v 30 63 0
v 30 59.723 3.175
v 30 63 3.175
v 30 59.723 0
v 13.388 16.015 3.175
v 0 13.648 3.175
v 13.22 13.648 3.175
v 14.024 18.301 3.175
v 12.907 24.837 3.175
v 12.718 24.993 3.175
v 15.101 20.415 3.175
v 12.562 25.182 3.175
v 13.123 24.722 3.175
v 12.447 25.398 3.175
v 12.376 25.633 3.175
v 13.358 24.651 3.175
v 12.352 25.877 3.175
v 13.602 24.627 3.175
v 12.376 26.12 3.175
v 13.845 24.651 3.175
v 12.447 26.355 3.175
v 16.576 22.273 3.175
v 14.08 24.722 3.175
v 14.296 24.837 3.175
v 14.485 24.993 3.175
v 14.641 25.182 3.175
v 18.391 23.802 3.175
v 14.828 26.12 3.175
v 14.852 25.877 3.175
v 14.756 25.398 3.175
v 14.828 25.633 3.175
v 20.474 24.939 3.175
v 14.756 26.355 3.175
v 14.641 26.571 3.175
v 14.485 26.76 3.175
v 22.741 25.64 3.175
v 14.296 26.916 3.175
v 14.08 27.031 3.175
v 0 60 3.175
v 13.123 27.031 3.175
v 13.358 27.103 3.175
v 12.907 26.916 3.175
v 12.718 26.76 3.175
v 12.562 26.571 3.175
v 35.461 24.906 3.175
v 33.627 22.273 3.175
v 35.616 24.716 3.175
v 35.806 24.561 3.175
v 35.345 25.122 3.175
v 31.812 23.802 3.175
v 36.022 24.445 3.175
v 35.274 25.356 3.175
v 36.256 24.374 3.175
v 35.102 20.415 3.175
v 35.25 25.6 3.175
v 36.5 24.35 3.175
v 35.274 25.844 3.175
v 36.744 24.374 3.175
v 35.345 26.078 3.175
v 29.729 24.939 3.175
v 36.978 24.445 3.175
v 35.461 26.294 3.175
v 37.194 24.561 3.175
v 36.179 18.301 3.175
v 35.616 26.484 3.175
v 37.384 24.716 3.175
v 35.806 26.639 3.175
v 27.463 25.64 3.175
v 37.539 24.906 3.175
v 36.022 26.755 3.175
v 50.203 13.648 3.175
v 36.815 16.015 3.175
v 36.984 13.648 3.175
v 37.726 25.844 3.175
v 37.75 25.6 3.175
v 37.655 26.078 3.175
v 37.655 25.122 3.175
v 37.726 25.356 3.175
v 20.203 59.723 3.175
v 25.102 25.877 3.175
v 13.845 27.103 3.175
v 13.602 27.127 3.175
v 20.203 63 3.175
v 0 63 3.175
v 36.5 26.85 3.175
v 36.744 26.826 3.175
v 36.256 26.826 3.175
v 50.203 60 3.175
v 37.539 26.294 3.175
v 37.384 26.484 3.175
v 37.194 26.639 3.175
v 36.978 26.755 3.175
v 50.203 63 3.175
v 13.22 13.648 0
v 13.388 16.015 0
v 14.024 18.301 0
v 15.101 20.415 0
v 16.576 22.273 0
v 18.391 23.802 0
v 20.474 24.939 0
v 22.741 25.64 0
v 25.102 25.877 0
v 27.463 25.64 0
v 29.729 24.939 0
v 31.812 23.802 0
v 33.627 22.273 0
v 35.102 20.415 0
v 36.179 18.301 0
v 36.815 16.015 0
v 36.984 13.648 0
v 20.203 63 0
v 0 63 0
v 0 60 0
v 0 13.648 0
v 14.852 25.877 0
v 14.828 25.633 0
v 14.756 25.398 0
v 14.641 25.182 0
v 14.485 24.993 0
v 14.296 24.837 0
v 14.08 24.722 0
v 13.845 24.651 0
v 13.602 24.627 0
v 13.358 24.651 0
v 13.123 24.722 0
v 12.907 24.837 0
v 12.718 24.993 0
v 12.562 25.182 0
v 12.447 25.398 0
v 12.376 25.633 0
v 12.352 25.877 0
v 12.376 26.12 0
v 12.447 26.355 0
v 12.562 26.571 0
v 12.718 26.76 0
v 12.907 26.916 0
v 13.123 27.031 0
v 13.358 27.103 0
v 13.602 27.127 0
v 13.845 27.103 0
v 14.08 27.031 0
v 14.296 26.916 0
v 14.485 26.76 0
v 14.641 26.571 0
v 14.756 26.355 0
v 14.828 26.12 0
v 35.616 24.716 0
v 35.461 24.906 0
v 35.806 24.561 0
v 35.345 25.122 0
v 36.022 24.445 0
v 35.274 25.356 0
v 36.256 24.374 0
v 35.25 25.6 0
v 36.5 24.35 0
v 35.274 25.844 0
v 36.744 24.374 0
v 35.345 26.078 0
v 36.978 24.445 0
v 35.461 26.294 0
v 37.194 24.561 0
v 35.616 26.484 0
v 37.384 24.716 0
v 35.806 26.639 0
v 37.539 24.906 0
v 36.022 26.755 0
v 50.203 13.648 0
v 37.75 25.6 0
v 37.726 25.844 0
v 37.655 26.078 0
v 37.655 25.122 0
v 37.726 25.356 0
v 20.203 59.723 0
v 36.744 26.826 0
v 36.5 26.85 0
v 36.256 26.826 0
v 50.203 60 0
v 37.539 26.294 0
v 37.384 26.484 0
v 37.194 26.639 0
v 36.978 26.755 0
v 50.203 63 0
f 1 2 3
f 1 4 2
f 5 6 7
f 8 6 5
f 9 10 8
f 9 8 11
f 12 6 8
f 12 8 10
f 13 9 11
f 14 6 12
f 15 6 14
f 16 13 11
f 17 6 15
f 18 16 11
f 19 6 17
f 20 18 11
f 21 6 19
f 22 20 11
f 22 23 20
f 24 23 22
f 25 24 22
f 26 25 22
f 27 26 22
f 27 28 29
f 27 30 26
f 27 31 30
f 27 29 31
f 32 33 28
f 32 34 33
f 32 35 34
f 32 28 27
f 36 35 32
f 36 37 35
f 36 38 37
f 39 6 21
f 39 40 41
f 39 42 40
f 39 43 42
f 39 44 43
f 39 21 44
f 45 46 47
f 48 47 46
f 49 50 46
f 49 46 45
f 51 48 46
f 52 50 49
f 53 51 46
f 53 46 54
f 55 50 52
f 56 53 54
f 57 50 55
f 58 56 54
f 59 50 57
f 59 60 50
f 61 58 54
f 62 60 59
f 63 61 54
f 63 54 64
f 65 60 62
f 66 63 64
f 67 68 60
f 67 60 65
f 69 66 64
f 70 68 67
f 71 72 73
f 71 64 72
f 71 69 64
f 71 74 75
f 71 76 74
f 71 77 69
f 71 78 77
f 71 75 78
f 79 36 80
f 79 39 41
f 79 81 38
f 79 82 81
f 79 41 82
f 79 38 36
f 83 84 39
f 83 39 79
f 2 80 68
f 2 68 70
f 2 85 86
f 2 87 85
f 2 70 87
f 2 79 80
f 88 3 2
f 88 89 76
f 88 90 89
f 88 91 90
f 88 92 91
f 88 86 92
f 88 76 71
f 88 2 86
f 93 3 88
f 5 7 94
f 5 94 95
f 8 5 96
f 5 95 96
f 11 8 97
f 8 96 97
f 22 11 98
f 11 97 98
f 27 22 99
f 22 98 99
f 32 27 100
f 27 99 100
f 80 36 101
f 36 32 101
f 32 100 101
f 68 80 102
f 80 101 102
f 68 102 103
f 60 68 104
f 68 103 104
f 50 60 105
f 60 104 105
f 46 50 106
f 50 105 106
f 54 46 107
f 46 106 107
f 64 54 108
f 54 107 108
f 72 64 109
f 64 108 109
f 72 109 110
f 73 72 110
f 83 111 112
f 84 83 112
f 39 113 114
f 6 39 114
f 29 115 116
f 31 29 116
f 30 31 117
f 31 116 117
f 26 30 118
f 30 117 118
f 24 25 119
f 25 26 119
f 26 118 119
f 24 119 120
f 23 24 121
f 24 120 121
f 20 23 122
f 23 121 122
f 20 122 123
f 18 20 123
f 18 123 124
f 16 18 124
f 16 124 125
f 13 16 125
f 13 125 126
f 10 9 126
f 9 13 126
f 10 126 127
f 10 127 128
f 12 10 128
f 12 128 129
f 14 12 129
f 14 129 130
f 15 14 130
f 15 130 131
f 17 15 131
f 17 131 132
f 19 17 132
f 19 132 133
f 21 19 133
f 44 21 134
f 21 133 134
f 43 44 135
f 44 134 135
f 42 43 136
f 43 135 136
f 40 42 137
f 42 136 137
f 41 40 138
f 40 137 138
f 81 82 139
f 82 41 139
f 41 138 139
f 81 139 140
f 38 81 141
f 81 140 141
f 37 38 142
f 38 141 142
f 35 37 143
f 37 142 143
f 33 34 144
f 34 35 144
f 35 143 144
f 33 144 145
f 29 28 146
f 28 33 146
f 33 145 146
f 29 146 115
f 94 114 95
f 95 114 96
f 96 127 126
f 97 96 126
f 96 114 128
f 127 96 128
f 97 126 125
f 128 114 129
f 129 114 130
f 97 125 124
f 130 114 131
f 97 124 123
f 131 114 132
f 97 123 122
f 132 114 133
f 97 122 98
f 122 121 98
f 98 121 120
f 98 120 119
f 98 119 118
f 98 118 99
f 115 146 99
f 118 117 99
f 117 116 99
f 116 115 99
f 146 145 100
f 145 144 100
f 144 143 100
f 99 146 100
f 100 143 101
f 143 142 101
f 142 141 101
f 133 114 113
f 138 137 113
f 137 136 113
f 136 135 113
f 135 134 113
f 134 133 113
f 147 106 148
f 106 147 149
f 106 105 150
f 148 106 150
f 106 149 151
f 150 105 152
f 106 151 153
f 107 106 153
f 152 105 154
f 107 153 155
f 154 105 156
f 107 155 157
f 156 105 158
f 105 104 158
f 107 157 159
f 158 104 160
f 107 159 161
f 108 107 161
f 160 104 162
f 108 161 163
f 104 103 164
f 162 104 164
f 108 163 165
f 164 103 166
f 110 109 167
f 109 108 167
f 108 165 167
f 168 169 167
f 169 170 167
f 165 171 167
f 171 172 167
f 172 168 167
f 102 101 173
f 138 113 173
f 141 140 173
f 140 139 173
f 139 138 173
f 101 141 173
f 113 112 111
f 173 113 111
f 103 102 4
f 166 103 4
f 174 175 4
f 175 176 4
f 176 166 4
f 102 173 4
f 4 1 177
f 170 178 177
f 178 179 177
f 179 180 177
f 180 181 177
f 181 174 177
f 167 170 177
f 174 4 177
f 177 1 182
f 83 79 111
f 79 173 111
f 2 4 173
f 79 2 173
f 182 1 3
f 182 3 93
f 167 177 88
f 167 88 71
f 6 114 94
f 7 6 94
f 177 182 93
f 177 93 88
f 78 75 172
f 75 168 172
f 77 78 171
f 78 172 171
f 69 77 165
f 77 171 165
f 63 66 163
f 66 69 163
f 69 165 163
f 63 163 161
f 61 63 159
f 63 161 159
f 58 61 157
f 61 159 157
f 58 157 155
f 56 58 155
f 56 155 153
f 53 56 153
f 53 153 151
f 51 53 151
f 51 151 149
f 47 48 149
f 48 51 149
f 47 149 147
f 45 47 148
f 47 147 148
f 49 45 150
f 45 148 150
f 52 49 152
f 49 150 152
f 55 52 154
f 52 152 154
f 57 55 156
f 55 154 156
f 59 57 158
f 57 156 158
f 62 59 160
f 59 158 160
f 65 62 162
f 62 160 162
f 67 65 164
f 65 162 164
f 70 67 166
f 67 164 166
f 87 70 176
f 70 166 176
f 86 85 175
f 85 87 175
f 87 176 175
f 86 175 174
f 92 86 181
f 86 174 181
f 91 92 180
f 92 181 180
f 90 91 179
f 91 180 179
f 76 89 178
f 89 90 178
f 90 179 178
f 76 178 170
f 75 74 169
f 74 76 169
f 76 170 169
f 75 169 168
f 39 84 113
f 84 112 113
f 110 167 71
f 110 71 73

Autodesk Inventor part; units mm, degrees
ref_plane "YZ Plane" through (0, 0, 0) normal (1, 0, 0) x (0, 1, 0)
ref_plane "XZ Plane" through (0, 0, 0) normal (0, 1, 0) x (-1, 0, 0)
ref_plane "XY Plane" through (0, 0, 0) normal (0, 0, 1) x (1, 0, 0)
sketch "Sketch1" plane through (0, 0, 0) normal (0, 0, 1) x (1, 0, 0)
  line L0 (20.2032, 59.7234) -> (20.2032, 63)
  line L1 (20.2032, 63) -> (0, 63)
  line L2 (0, 63) -> (0, 60)
  line L3 (30, 59.7234) -> (30, 63)
  line L4 (30, 63) -> (50.2032, 63)
  line L5 (50.2032, 63) -> (50.2032, 60)
  line L6 (30, 59.7234) -> (20.2032, 59.7234)
  circle A0 centre (13.6016, 25.8766) radius 1.25
  circle A1 centre (36.5, 25.6) radius 1.25
  line L7 (20.2032, 59.7234) -> (20.2032, 63)
  line L8 (20.2032, 63) -> (0, 63)
  line L9 (0, 63) -> (0, 60)
  line L10 (30, 59.7234) -> (30, 63)
  line L11 (30, 63) -> (50.2032, 63)
  line L12 (50.2032, 63) -> (50.2032, 60)
  line L13 (30, 59.7234) -> (20.2032, 59.7234)
  circle A2 centre (13.6016, 25.8766) radius 1.25
  circle A3 centre (36.5, 25.6) radius 1.25
  line L14 (0, 60) -> (0, 13.648)
  line L15 (50.2032, 60) -> (50.2032, 13.648)
  line L16 (0, 13.648) -> (13.2196, 13.648)
  line L17 (50.2032, 13.648) -> (36.9836, 13.648)
  arc A4 (36.9836, 13.648) -> (13.2196, 13.648) centre (25.1016, 13.9897) ccw
  point P0 (0, 0)
  dimension "d0" = 20.2032
  dimension "d1" = 3.2766
  dimension "d2" = 20.2032
  dimension "d3" = 2.5
  dimension "d4" = 2.5
  dimension "d7" = 20.2032
  dimension "d8" = 3.2766
  dimension "d9" = 20.2032
  dimension "d10" = 2.5
  dimension "d11" = 2.5
  dimension "d14" = 46.352
  dimension "d15" = 13.2196
  dimension "d16" = 13.2196
extrude "Extrusion1" add sketch "Sketch1" along normal blind 3.175
equation "\"d0\" = d5"
equation "\"d1\" = d6"
equation "\"d2\" = d5"
equation "\"d7\" = d12"
equation "\"d8\" = d13"
equation "\"d9\" = d12"
equation "\"d16\" = d15"
equation "\"d5\" = 20.2032"
equation "\"d6\" = 3.2766"
equation "\"d12\" = 20.2032"
equation "\"d13\" = 3.2766"
properties part number "side_plate_top"
